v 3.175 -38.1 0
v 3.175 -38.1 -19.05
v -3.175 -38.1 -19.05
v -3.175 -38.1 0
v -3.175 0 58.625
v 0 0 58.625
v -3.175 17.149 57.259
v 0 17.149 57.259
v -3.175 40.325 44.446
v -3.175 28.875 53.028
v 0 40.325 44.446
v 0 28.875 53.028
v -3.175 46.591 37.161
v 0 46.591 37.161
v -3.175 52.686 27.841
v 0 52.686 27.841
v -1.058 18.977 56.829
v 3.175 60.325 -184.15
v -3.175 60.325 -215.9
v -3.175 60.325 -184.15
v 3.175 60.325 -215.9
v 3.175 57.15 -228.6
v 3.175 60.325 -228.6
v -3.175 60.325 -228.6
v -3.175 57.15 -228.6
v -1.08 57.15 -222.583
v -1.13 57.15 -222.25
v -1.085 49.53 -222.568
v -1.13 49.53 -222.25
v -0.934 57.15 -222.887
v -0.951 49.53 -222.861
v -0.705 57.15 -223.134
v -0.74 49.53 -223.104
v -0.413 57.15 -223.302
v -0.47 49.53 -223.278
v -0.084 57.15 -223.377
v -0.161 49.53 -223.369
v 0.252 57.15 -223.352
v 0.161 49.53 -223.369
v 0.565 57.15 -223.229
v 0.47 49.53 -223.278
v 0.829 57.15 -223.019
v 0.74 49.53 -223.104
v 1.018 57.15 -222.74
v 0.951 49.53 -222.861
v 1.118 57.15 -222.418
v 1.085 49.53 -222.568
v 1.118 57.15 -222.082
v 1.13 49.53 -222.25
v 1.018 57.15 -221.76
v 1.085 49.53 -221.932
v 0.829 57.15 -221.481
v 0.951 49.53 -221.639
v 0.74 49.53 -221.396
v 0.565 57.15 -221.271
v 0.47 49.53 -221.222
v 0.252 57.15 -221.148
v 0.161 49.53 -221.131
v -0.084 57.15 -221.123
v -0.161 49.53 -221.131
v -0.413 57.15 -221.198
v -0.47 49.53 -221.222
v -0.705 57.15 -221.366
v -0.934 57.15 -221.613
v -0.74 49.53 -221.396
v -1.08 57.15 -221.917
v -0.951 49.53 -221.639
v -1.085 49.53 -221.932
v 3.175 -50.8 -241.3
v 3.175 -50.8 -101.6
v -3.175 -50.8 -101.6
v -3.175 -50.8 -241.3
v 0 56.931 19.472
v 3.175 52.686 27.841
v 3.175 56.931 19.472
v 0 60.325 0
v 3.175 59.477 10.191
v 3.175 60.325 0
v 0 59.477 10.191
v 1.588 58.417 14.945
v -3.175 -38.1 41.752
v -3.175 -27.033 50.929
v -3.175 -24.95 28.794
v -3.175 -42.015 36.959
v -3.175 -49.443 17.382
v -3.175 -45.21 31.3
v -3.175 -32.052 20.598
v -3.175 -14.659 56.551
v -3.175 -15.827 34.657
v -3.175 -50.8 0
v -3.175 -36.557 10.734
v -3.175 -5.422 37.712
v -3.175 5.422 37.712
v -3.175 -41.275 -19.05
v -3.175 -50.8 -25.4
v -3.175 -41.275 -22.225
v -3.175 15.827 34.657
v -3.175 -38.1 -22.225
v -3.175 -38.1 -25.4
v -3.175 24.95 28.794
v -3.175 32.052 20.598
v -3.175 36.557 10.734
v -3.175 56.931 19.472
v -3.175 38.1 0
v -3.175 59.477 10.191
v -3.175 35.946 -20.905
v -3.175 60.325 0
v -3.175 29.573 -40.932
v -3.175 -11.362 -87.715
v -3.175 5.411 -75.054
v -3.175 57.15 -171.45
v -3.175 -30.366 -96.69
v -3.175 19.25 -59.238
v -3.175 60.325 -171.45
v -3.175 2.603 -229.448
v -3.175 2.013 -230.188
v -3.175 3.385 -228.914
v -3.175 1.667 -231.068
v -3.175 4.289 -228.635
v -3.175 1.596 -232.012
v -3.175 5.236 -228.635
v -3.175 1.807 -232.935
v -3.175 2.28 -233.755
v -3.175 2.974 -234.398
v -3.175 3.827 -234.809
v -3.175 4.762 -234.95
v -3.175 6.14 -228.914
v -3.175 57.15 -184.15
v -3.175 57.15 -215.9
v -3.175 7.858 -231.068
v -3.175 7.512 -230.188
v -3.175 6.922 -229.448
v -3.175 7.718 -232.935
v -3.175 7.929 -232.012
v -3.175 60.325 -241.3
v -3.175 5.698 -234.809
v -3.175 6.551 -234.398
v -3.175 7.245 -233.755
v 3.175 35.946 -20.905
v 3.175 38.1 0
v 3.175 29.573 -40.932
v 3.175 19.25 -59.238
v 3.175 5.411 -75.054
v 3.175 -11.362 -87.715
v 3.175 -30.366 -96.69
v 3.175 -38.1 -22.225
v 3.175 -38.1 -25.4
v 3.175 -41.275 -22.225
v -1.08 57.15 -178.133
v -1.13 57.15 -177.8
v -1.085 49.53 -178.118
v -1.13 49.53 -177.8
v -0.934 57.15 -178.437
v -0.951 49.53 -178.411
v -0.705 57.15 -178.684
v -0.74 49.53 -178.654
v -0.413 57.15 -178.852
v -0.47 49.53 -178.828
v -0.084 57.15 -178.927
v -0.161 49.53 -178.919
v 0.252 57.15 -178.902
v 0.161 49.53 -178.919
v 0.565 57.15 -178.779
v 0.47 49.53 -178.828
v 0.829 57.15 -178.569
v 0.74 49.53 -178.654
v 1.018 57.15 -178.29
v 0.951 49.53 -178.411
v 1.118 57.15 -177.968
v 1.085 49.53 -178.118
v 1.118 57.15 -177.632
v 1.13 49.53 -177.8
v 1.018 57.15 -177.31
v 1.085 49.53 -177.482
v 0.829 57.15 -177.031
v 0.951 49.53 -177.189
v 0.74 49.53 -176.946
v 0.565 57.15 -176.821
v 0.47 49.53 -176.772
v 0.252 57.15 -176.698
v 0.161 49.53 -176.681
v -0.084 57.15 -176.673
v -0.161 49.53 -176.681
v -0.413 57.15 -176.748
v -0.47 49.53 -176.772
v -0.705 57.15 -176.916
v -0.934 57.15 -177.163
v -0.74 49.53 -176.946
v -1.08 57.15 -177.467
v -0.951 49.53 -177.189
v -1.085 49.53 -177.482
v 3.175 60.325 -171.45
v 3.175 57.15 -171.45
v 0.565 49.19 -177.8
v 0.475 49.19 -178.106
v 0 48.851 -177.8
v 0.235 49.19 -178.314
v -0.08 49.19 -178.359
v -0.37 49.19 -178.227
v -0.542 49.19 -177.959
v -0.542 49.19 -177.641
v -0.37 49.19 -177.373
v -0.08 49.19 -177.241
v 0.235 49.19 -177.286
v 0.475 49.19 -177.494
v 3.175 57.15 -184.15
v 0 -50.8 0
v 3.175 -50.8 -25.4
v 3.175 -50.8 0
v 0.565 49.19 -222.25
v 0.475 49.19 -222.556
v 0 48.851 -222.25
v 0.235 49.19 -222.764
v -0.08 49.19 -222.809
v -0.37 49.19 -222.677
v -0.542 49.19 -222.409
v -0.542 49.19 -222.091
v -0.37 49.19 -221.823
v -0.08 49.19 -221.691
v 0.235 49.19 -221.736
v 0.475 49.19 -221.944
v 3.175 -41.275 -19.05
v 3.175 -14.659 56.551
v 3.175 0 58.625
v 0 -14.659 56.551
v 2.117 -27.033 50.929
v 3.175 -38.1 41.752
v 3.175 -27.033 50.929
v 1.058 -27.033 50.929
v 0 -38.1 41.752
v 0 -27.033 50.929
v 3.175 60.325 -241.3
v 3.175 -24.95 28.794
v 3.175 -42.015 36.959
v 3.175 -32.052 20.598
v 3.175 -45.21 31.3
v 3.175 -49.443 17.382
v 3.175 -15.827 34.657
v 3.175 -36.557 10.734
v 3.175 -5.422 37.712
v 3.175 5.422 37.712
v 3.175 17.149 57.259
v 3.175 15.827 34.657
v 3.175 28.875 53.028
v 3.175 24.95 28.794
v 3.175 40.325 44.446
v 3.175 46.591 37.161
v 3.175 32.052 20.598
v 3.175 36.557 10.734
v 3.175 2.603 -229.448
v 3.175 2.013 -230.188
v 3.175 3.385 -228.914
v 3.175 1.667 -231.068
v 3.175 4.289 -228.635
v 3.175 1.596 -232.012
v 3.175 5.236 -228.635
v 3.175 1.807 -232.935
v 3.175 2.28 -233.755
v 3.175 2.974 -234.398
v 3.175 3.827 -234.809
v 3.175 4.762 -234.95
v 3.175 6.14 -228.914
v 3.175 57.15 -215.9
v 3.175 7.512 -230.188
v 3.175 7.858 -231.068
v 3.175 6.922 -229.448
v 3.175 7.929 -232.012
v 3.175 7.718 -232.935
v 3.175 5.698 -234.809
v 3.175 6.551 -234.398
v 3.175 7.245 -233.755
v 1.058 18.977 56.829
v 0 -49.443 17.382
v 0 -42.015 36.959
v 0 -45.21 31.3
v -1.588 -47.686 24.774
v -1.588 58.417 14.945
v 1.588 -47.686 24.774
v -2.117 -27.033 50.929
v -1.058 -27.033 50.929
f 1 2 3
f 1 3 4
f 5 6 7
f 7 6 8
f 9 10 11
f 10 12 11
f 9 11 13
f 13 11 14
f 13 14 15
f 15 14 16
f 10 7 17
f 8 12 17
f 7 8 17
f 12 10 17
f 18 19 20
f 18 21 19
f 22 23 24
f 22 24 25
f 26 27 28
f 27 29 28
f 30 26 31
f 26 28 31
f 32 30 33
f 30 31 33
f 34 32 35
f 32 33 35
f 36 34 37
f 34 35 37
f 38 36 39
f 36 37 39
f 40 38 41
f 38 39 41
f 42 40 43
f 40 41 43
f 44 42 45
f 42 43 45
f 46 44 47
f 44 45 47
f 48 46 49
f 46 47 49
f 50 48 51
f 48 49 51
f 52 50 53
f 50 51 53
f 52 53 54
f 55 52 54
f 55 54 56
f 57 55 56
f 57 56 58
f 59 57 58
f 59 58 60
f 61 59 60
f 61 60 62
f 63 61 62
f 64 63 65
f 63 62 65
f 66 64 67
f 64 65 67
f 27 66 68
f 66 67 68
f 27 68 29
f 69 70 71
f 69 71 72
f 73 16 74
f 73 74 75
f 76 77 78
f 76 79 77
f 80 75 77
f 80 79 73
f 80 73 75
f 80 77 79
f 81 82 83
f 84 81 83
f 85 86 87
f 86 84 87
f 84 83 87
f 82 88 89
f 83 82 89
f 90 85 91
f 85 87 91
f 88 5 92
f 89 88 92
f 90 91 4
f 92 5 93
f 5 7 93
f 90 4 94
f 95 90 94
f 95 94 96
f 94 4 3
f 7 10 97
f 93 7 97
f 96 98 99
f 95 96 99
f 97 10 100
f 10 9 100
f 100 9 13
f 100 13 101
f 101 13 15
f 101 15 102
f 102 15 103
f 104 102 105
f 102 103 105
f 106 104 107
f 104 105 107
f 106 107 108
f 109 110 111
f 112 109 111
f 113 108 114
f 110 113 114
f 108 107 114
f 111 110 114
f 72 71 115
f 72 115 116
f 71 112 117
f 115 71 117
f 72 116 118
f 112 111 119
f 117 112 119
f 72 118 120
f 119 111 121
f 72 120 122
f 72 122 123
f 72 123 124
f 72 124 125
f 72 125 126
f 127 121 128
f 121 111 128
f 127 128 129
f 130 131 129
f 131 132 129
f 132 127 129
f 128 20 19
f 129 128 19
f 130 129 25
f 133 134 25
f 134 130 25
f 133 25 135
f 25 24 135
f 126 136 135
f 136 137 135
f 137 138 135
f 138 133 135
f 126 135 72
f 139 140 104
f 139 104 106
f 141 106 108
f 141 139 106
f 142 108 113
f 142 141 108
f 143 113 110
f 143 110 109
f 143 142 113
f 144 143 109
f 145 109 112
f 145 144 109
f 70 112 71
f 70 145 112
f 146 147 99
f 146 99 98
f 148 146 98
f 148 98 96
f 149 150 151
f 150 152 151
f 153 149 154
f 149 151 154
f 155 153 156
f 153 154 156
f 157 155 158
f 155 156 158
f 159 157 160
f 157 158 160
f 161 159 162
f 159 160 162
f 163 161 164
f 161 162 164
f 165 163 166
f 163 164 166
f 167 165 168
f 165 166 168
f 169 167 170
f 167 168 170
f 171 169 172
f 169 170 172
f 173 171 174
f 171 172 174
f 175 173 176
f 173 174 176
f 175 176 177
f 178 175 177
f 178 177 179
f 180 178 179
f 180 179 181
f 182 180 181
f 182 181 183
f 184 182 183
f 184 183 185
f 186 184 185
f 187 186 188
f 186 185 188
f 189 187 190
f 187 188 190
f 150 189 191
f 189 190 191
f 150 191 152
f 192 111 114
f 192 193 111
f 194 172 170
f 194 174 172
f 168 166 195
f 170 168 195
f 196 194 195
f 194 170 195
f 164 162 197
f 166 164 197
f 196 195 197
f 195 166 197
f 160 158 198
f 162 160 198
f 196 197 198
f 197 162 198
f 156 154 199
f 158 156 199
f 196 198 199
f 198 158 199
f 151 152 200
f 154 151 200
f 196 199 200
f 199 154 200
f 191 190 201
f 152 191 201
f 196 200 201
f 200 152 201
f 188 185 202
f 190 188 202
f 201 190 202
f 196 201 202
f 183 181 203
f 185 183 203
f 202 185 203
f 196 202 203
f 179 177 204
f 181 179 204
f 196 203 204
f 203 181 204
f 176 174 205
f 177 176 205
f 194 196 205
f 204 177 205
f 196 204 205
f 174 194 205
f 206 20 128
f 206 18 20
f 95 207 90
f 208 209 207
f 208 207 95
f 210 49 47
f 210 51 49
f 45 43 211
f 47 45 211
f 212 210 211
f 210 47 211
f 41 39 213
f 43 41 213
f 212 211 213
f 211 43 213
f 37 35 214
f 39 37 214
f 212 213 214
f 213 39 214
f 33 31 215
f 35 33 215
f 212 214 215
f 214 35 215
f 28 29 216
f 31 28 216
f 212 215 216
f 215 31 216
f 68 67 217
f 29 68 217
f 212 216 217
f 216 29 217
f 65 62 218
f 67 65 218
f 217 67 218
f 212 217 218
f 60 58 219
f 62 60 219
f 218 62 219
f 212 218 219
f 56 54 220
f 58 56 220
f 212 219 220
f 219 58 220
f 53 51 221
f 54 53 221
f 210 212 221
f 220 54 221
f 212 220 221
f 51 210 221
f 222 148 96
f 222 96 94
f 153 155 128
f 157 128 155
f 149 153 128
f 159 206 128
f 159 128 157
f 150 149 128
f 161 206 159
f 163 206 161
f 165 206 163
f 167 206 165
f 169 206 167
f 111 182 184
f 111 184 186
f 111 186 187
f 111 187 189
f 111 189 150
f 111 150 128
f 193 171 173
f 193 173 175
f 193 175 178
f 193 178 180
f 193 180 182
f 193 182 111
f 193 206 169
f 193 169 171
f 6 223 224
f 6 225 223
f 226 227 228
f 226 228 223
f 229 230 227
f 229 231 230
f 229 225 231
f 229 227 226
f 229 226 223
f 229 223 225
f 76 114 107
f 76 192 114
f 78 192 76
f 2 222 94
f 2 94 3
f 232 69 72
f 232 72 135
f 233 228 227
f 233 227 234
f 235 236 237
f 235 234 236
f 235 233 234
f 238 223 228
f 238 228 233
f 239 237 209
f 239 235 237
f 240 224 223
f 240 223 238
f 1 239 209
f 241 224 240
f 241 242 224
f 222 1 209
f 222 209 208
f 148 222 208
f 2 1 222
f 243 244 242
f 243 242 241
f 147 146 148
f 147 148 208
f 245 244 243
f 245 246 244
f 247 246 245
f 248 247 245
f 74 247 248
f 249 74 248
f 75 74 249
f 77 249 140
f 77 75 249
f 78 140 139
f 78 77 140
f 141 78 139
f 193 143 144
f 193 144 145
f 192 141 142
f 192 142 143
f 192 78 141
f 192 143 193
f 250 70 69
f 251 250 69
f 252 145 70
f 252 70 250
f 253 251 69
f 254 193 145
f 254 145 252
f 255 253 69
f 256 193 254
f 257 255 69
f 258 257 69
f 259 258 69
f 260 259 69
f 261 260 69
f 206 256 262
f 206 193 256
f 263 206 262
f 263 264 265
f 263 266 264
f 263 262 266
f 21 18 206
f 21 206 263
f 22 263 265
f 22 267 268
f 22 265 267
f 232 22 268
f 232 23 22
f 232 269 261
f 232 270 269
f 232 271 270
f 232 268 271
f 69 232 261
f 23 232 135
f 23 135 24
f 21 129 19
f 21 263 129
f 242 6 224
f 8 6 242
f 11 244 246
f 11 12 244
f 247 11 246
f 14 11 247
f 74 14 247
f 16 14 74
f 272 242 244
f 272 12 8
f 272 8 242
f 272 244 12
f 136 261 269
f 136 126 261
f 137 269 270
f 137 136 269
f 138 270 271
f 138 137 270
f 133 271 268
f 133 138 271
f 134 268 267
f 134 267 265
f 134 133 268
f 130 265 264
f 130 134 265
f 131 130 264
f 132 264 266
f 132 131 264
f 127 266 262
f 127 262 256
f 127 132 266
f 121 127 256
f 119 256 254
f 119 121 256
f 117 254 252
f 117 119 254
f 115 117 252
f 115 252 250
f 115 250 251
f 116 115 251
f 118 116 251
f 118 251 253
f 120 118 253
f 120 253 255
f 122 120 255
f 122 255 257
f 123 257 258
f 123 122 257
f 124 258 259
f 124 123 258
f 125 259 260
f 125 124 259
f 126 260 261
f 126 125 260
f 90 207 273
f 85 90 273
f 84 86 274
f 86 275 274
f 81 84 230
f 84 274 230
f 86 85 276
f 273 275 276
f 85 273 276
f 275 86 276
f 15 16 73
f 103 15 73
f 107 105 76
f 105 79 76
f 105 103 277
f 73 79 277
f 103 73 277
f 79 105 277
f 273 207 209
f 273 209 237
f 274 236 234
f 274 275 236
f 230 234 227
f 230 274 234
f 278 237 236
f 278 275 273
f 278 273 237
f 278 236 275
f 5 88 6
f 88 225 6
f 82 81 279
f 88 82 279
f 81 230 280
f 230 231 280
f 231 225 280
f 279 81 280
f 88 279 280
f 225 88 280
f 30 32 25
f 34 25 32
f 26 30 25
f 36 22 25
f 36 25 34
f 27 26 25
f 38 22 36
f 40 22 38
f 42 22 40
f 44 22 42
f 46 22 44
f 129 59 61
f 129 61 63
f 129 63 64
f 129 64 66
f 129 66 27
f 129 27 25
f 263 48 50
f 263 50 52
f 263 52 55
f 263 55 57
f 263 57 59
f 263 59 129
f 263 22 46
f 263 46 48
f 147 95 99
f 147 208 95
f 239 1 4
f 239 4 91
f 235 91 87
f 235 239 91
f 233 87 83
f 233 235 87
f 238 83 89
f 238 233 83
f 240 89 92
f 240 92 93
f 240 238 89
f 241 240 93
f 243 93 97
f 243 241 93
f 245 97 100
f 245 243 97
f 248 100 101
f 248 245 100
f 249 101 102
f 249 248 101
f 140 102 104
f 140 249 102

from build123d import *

# Parameters (mm, degrees)
SKETCH1_R                 = 3.175
BOSS_EXTRUDE2_DEPTH       = 3.175
F_4_40_TAPPED_HOLE1_D     = 2.2606
F_4_40_TAPPED_HOLE1_DEPTH = 7.62
F_4_40_TAPPED_HOLE1_TIP   = 0.679152758


with BuildPart() as part:
    # Sketch1 → Boss-Extrude2 (new body, symmetric)
    with BuildSketch(Plane(origin=(0, 0, 0), x_dir=(0, 0, -1), z_dir=(1, 0, 0))):
        with BuildLine():
            Line((25.4, -50.8), (25.4, -38.1))
            Line((25.4, -38.1), (22.225, -38.1))
            Line((22.225, -38.1), (22.225, -41.275))
            Line((22.225, -41.275), (19.05, -41.275))
            Line((19.05, -41.275), (19.05, -38.1))
            Line((19.05, -38.1), (0, -38.1))
            ThreePointArc((0, -38.1), (-38.1, 0), (0, 38.1))
            ThreePointArc((0, 38.1), (67.501425911, 12.737343898), (101.6, -50.8))
            Line((101.6, -50.8), (241.3, -50.8))
            Line((241.3, -50.8), (241.3, 60.325))
            Line((241.3, 60.325), (228.6, 60.325))
            Line((228.6, 60.325), (228.6, 57.15))
            Line((228.6, 57.15), (215.9, 57.15))
            Line((215.9, 57.15), (215.9, 60.325))
            Line((215.9, 60.325), (184.15, 60.325))
            Line((184.15, 60.325), (184.15, 57.15))
            Line((184.15, 57.15), (171.45, 57.15))
            Line((171.45, 57.15), (171.45, 60.325))
            Line((171.45, 60.325), (0, 60.325))
            add(Edge.make_bspline(
                [(-27.840906439, 52.6855483), (-15.97034645, 60.327815279), (0, 60.325)],
                knots=[0.821555454, 0.821555454, 0.821555454, 1, 1, 1], degree=2))
            add(Edge.make_bspline(
                [(-58.625125689, 0), (-58.995342849, 19.785116254), (-54.931758321, 37.043947765), (-27.840906439, 52.6855483)],
                knots=[0.494452285, 0.494452285, 0.494452285, 0.494452285, 0.821555454, 0.821555454, 0.821555454, 0.821555454], degree=3))
            add(Edge.make_bspline(
                [(-41.752199567, -38.1), (-52.707301474, -27.360886787), (-58.323372846, -16.126251656), (-58.625125689, 0)],
                knots=[0.219145, 0.219145, 0.219145, 0.219145, 0.494452285, 0.494452285, 0.494452285, 0.494452285], degree=3))
            add(Edge.make_bspline(
                [(0, -50.8), (-28.671783901, -50.922524692), (-41.752199567, -38.1)],
                knots=[0, 0, 0, 0.219145, 0.219145, 0.219145], degree=2))
            Line((0, -50.8), (25.4, -50.8))
        make_face()
        with Locations((231.775, 4.7625)):
            Circle(SKETCH1_R, mode=Mode.SUBTRACT)
    extrude(amount=BOSS_EXTRUDE2_DEPTH, both=True)

    # #4-40 Tapped Hole1
    with Locations(Plane(origin=(0, 57.15, 0), x_dir=(1, 0, 0), z_dir=(0, 1, 0))):
        with Locations((0, 177.8), (0, 222.25)):
            Hole(F_4_40_TAPPED_HOLE1_D / 2, depth=F_4_40_TAPPED_HOLE1_DEPTH)
            with Locations((0, 0, -(F_4_40_TAPPED_HOLE1_DEPTH + F_4_40_TAPPED_HOLE1_TIP / 2))):  # 118° drill point
                Cone(0, F_4_40_TAPPED_HOLE1_D / 2, F_4_40_TAPPED_HOLE1_TIP, mode=Mode.SUBTRACT)


solid = part.part
